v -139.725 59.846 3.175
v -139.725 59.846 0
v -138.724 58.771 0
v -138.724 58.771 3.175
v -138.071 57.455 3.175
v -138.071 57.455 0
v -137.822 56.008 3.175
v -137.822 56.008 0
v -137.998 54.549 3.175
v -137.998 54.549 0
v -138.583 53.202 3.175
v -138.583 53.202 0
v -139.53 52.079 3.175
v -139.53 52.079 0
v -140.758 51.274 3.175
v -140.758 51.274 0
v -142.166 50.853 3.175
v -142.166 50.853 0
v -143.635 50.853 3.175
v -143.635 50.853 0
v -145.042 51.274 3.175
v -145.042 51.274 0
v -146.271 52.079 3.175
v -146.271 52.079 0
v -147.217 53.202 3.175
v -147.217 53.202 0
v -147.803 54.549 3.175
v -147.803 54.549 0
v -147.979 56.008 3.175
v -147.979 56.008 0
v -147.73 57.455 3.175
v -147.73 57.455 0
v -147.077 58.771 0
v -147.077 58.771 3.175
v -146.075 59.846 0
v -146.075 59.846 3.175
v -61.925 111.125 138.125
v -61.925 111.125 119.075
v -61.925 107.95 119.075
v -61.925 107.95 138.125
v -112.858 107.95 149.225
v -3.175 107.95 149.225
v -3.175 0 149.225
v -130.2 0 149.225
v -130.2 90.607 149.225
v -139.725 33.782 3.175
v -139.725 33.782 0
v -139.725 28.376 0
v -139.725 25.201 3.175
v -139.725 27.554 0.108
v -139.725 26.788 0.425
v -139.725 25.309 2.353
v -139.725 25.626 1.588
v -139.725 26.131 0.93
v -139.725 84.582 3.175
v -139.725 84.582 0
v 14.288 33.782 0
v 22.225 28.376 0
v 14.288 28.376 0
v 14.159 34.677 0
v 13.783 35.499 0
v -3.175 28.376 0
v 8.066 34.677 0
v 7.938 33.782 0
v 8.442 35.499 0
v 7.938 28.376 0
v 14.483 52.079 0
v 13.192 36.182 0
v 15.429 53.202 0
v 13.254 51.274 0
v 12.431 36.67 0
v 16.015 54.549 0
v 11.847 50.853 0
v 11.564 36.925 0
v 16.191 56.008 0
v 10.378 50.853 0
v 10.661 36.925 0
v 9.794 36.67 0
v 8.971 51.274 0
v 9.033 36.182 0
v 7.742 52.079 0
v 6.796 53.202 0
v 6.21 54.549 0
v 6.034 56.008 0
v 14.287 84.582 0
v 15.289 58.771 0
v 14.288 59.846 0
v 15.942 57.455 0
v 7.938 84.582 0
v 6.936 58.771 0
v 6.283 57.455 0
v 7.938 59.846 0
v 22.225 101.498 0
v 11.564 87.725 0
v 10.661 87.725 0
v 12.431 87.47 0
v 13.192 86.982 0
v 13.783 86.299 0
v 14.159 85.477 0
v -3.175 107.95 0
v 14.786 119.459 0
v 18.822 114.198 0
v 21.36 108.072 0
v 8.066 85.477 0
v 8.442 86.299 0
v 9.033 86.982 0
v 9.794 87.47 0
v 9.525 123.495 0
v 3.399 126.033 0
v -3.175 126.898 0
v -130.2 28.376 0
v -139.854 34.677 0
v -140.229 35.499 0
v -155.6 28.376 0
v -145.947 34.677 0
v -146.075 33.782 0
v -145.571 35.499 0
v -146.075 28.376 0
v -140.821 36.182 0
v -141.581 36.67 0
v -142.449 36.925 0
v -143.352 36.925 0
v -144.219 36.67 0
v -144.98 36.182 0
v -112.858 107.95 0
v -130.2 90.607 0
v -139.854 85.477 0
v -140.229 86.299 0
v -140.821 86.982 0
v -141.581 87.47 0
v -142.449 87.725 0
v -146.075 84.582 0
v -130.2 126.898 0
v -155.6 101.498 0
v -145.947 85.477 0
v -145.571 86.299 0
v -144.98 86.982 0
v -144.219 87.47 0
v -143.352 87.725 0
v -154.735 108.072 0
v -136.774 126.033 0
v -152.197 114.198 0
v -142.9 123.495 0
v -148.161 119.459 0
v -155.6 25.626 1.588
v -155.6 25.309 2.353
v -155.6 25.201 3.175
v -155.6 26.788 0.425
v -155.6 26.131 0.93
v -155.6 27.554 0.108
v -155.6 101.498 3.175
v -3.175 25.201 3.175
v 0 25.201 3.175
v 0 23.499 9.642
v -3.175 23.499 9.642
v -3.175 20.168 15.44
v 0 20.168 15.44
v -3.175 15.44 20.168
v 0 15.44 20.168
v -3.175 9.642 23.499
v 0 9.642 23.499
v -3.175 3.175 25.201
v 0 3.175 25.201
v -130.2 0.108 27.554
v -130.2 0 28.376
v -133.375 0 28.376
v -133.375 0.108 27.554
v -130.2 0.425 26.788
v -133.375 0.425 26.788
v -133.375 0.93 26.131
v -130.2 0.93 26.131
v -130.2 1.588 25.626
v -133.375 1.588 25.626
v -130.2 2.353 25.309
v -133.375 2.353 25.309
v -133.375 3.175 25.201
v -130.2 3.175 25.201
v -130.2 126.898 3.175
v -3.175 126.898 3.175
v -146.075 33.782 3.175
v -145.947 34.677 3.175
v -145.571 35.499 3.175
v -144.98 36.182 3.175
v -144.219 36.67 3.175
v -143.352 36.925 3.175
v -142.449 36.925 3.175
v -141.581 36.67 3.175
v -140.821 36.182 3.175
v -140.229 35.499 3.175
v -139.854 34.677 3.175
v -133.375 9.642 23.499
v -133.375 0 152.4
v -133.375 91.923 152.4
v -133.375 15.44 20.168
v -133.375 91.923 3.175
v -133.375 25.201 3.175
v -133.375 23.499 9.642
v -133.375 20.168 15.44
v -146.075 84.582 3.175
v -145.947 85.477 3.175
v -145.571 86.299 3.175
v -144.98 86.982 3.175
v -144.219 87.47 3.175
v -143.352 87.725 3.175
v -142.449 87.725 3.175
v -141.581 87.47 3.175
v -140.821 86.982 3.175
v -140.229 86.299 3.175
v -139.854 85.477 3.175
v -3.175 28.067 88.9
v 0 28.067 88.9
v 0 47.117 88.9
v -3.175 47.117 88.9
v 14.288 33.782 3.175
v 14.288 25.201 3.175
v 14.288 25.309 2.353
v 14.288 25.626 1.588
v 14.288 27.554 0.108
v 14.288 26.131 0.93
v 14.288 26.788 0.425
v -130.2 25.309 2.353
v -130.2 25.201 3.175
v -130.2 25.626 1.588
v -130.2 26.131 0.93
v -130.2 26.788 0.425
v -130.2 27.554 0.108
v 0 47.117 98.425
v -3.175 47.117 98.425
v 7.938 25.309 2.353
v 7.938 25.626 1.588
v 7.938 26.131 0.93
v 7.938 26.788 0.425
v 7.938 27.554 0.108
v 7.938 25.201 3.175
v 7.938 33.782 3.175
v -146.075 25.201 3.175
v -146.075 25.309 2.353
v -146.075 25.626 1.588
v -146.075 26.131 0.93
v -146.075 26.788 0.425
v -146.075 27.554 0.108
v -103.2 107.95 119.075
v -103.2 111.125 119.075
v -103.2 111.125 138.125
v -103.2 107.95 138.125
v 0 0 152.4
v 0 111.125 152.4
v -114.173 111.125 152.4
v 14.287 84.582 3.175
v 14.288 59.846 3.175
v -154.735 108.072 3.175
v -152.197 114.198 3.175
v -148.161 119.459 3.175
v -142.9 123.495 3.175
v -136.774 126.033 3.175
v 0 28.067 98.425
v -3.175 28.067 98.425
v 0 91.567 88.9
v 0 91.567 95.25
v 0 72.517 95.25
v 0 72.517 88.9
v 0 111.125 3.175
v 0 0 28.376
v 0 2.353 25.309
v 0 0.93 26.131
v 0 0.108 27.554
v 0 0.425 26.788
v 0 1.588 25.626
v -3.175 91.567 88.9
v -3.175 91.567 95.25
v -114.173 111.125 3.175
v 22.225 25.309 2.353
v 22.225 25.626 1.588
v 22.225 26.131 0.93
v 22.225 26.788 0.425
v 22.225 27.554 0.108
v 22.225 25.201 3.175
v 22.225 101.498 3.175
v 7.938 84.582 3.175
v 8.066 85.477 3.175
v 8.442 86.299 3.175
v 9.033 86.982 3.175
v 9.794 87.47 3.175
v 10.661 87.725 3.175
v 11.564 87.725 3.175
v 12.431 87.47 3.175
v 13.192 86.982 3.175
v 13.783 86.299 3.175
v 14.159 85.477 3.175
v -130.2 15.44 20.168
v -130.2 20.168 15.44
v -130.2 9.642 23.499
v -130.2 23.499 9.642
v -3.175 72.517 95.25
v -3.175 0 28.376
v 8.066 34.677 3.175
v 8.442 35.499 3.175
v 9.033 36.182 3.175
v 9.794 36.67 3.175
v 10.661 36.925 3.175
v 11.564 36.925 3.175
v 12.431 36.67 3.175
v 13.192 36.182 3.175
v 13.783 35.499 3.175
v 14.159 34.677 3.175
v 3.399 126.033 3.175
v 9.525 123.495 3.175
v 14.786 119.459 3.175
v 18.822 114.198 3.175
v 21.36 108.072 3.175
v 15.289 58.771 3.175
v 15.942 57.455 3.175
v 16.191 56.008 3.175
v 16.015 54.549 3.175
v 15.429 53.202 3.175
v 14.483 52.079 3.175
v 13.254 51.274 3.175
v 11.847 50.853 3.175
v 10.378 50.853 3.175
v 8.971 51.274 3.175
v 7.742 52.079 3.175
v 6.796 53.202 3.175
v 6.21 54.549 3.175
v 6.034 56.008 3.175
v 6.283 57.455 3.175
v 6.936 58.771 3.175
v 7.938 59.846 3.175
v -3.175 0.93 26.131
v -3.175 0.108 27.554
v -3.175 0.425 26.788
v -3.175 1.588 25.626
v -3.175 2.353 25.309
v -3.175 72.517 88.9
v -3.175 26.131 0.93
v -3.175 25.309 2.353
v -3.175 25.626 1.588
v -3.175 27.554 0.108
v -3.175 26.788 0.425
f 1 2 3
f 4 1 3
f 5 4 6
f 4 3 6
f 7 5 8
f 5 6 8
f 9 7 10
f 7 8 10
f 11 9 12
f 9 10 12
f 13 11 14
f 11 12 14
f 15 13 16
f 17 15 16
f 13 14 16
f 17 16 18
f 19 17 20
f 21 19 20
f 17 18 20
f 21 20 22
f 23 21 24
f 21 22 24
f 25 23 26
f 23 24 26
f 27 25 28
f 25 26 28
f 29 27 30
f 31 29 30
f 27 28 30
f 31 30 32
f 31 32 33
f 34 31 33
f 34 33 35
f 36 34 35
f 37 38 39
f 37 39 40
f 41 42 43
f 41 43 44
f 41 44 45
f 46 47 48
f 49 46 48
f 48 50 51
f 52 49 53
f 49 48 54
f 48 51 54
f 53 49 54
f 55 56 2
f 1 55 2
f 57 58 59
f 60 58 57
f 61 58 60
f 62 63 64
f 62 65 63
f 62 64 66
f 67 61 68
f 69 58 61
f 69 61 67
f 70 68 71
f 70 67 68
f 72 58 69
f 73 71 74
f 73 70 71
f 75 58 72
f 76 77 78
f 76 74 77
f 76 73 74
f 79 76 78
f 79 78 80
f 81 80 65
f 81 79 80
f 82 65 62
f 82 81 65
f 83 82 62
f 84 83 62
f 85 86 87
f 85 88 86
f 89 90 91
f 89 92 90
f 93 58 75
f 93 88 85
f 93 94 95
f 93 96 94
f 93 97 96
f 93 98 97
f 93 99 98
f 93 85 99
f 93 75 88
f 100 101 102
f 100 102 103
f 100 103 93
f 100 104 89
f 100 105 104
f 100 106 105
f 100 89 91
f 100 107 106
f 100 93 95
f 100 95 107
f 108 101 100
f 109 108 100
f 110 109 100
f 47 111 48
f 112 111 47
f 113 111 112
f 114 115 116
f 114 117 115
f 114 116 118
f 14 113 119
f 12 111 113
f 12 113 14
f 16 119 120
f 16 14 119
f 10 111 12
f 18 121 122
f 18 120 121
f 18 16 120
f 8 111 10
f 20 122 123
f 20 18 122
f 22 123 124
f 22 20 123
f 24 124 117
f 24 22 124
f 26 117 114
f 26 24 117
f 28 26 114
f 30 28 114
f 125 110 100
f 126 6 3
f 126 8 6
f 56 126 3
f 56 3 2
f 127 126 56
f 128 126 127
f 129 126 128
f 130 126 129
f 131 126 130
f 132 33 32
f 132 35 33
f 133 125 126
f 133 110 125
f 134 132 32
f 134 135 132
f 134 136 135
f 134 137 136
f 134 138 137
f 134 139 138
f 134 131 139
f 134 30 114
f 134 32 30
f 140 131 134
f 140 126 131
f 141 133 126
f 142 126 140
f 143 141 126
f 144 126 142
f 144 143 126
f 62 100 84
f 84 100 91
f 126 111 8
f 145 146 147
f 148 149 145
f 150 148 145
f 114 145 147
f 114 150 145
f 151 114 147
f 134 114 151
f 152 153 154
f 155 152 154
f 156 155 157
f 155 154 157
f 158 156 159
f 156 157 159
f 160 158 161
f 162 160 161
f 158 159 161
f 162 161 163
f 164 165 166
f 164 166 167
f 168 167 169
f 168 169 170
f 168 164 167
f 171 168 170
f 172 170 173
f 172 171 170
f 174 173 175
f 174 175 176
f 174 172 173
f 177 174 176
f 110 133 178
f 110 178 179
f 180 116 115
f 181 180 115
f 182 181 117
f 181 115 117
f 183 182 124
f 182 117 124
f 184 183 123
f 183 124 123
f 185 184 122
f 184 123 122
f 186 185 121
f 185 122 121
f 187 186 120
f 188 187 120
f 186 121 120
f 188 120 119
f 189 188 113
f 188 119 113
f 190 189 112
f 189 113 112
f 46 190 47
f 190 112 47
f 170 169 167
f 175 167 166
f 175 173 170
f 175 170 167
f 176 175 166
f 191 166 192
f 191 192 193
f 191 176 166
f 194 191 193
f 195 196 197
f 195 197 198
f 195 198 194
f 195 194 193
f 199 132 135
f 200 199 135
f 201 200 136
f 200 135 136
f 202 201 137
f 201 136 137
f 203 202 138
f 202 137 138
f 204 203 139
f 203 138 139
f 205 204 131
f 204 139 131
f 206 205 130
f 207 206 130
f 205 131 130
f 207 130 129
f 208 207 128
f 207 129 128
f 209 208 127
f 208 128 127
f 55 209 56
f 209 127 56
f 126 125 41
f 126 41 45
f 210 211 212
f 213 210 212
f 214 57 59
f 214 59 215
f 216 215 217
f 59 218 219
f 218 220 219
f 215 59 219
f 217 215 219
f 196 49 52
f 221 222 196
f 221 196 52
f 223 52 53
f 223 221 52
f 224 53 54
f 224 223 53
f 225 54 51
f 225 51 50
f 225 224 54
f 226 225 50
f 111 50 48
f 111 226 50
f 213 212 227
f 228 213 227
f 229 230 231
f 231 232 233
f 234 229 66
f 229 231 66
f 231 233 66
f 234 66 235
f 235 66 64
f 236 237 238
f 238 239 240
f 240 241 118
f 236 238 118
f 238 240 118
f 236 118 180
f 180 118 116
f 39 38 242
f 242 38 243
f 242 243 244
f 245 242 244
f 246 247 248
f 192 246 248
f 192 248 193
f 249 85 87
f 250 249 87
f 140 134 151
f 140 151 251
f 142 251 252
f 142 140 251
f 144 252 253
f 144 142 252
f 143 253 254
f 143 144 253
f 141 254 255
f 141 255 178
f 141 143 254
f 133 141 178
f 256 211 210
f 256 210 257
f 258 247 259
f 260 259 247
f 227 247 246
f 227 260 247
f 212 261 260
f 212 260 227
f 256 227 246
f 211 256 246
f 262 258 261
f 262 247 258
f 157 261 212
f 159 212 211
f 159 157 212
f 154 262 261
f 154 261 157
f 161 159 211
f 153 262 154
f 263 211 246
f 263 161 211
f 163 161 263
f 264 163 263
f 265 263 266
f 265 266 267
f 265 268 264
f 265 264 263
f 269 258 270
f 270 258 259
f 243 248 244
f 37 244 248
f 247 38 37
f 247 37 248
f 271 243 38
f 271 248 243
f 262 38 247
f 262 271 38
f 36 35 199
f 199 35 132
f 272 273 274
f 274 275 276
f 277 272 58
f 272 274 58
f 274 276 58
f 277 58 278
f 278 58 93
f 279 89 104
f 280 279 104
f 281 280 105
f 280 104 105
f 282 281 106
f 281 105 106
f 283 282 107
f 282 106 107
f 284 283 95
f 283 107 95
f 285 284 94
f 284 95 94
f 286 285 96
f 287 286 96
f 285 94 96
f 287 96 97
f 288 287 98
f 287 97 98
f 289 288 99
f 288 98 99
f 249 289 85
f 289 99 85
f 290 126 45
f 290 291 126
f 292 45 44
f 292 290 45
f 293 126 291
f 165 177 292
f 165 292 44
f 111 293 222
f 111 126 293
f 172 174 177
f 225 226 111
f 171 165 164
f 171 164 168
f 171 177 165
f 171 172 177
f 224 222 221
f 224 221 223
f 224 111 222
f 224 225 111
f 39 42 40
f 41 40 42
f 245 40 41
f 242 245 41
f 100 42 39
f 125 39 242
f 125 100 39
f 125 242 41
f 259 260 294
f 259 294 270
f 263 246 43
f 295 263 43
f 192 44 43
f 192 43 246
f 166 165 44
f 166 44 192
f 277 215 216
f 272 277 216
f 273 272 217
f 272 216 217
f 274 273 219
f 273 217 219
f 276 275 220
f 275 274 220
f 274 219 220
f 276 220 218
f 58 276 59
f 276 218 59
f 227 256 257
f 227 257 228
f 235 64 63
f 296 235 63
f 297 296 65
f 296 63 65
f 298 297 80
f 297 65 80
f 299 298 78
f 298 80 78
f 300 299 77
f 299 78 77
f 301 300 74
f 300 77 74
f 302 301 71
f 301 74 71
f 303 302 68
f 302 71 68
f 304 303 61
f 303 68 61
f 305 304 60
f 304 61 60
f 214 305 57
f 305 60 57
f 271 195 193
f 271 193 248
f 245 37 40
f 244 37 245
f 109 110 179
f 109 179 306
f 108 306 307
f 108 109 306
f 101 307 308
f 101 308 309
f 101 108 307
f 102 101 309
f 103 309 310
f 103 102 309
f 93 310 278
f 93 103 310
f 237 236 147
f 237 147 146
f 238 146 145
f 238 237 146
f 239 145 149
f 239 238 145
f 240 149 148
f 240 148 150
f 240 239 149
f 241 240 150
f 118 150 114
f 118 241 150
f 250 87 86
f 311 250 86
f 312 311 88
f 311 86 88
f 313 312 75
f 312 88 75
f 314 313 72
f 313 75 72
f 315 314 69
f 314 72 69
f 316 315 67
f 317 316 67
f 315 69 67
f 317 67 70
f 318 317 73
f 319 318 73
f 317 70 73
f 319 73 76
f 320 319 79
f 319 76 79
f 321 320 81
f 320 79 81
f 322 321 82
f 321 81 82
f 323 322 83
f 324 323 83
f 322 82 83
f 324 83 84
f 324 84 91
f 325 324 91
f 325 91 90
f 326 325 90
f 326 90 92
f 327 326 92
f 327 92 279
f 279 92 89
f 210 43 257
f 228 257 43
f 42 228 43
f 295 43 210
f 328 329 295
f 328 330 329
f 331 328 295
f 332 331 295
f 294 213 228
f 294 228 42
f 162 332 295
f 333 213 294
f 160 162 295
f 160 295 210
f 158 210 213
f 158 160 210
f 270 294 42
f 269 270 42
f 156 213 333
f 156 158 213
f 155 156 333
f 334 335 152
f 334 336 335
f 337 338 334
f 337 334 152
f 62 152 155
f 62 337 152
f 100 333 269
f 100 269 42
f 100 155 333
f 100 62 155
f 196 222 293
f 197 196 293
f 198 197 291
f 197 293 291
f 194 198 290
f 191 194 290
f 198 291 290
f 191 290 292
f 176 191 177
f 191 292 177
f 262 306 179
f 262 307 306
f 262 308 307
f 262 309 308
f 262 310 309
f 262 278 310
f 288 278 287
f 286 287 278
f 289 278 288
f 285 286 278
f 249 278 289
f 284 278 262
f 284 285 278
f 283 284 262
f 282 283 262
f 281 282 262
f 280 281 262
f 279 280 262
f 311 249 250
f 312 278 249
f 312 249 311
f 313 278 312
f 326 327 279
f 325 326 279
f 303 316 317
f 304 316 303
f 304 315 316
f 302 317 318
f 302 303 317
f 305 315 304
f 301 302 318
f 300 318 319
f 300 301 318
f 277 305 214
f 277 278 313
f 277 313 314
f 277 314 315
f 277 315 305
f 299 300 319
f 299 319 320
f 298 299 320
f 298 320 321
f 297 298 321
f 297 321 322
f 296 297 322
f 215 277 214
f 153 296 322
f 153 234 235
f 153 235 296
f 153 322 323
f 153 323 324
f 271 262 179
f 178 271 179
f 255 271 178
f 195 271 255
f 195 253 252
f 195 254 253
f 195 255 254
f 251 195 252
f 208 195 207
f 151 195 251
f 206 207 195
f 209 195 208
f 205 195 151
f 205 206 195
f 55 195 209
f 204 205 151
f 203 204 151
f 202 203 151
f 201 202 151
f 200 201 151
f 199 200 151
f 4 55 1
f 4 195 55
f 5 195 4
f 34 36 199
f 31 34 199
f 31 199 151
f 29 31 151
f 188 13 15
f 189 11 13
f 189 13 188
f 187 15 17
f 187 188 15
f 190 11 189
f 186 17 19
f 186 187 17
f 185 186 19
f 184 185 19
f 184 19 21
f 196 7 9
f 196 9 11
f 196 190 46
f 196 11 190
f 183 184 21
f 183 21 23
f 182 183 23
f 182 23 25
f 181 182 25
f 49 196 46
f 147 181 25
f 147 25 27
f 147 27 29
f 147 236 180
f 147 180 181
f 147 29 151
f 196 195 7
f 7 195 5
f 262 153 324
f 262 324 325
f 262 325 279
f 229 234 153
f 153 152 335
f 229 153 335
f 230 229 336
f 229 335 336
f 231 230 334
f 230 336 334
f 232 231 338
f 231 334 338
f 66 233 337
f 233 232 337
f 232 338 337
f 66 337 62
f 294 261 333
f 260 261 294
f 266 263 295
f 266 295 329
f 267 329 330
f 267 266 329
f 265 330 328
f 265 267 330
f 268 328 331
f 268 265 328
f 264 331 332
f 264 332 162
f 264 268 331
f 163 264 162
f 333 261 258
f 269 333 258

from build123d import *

# Parameters (mm, degrees)
PAD_DEPTH         = 149.225
PAD001_DEPTH      = 3.175
PAD002_DEPTH      = 3.175
POCKET_DEPTH      = 155.6014
POCKET_DEPTH_BACK = 22.226
SKETCH004_W       = 19.05
SKETCH004_H       = 9.525
SKETCH004_H_2     = 6.35
POCKET001_DEPTH   = 3.175
SKETCH005_W       = 41.275
SKETCH005_H       = 19.05
POCKET002_DEPTH   = 111.126


with BuildPart() as part:
    # Sketch → Pad (new body)
    with BuildSketch(Plane.XY):
        Polygon((-133.3754, 0), (-133.3754, 91.9226), (-114.173, 111.125), (0, 111.125), (0, 0), (-3.175, 0), (-3.175, 107.95), (-112.857872, 107.95), (-130.2004, 90.607472), (-130.2004, 0), align=None)
    extrude(amount=PAD_DEPTH)

    # Sketch001 (on Face12 of Pad) → Pad001 (join)
    with BuildSketch(Plane.XY.offset(149.225)):
        Polygon((-114.173, 111.125), (0, 111.125), (0, 0), (-133.3754, 0), (-133.3754, 91.9226), align=None)
    extrude(amount=PAD001_DEPTH)

    # Sketch002 (on Face4 of Pad001) → Pad002 (join)
    with BuildSketch(Plane(origin=(0, 0, 0), x_dir=(1, 0, 0), z_dir=(0, 0, -1))):
        with BuildLine():
            Line((-130.2004, 0), (-130.2004, -90.607472))
            Line((-130.2004, -90.607472), (-112.857872, -107.95))
            Line((-112.857872, -107.95), (-3.175, -107.95))
            Line((-3.175, -107.95), (-3.175, 0))
            Line((-3.175, 0), (6.0325, 0))
            Line((6.0325, 0), (6.0325, -5.08))
            ThreePointArc((6.0325, -5.08), (6.53345, -7.279705), (7.9375, -9.045574))
            Line((7.9375, -9.045574), (7.9375, -33.782))
            ThreePointArc((7.9375, -33.782), (11.1125, -36.957), (14.2875, -33.782))
            Line((14.2875, -33.782), (14.2875, -9.045574))
            ThreePointArc((14.2875, -9.045574), (15.69155, -7.279705), (16.1925, -5.08))
            Line((16.1925, -5.08), (16.1925, 0))
            Line((16.1925, 0), (22.225, 0))
            Line((22.225, 0), (22.225, -101.4984))
            ThreePointArc((-3.175, -126.8984), (14.785512, -119.458912), (22.225, -101.4984))
            Line((-130.2004, -126.8984), (-3.175, -126.8984))
            ThreePointArc((-155.6004, -101.4984), (-148.160912, -119.458912), (-130.2004, -126.8984))
            Line((-155.6004, 0), (-155.6004, -101.4984))
            Line((-155.6004, 0), (-147.9804, 0))
            Line((-147.9804, -5.08), (-147.9804, 0))
            ThreePointArc((-147.9804, -5.08), (-147.47945, -7.279705), (-146.0754, -9.045574))
            Line((-146.0754, -9.045574), (-146.0754, -33.782))
            ThreePointArc((-146.0754, -33.782), (-142.9004, -36.957), (-139.7254, -33.782))
            Line((-139.7254, -33.782), (-139.7254, -9.045574))
            ThreePointArc((-139.7254, -9.045574), (-138.32135, -7.279705), (-137.8204, -5.08))
            Line((-137.8204, -5.08), (-137.8204, 0))
            Line((-137.8204, 0), (-130.2004, 0))
        make_face()
        with BuildLine():
            ThreePointArc((14.2875, -59.845574), (11.1125, -50.8), (7.9375, -59.845574))
            Line((7.9375, -59.845574), (7.9375, -84.582))
            ThreePointArc((7.9375, -84.582), (11.1125, -87.757), (14.2875, -84.582))
            Line((14.2875, -84.582), (14.2875, -59.845574))
        make_face(mode=Mode.SUBTRACT)
        with BuildLine():
            ThreePointArc((-139.7254, -59.845574), (-142.9004, -50.8), (-146.0754, -59.845574))
            Line((-146.0754, -59.845574), (-146.0754, -84.582))
            ThreePointArc((-146.0754, -84.582), (-142.9004, -87.757), (-139.7254, -84.582))
            Line((-139.7254, -84.582), (-139.7254, -59.845574))
        make_face(mode=Mode.SUBTRACT)
    extrude(amount=-PAD002_DEPTH)

    # Sketch003 (on Face48 of Pad002) → Pocket (cut, two sides)
    with BuildSketch(Plane.YZ) as pocket_sk:
        with BuildLine():
            ThreePointArc((25.200781, 3.175), (17.960512, 17.960512), (3.175, 25.200781))
            ThreePointArc((0, 28.375781), (0.929936, 26.130717), (3.175, 25.200781))
            Line((0, 28.375781), (-5, 28.375781))
            Line((-5, 28.375781), (-5, -5))
            Line((-5, -5), (28.375781, -5))
            Line((28.375781, -5), (28.375781, 0))
            ThreePointArc((25.200781, 3.175), (26.130717, 0.929936), (28.375781, 0))
        make_face()
    extrude(amount=-POCKET_DEPTH, mode=Mode.SUBTRACT)
    extrude(pocket_sk.sketch, amount=POCKET_DEPTH_BACK, mode=Mode.SUBTRACT)

    # Sketch004 (on Face38 of Pocket) → Pocket001 (cut)
    with BuildSketch(Plane.YZ):
        with Locations((37.592, 93.6625)):
            Rectangle(SKETCH004_W, SKETCH004_H)
        with Locations((82.042, 92.075)):
            Rectangle(SKETCH004_W, SKETCH004_H_2)
    extrude(amount=-POCKET001_DEPTH, mode=Mode.SUBTRACT)

    # Sketch005 (on Face39 of Pocket001) → Pocket002 (cut, through all)
    with BuildSketch(Plane(origin=(0, 111.125, 0), x_dir=(-1, 0, 0), z_dir=(0, 1, 0))):
        with Locations((82.5627, 128.6002)):
            Rectangle(SKETCH005_W, SKETCH005_H)
    extrude(amount=-POCKET002_DEPTH, mode=Mode.SUBTRACT)


solid = part.part
